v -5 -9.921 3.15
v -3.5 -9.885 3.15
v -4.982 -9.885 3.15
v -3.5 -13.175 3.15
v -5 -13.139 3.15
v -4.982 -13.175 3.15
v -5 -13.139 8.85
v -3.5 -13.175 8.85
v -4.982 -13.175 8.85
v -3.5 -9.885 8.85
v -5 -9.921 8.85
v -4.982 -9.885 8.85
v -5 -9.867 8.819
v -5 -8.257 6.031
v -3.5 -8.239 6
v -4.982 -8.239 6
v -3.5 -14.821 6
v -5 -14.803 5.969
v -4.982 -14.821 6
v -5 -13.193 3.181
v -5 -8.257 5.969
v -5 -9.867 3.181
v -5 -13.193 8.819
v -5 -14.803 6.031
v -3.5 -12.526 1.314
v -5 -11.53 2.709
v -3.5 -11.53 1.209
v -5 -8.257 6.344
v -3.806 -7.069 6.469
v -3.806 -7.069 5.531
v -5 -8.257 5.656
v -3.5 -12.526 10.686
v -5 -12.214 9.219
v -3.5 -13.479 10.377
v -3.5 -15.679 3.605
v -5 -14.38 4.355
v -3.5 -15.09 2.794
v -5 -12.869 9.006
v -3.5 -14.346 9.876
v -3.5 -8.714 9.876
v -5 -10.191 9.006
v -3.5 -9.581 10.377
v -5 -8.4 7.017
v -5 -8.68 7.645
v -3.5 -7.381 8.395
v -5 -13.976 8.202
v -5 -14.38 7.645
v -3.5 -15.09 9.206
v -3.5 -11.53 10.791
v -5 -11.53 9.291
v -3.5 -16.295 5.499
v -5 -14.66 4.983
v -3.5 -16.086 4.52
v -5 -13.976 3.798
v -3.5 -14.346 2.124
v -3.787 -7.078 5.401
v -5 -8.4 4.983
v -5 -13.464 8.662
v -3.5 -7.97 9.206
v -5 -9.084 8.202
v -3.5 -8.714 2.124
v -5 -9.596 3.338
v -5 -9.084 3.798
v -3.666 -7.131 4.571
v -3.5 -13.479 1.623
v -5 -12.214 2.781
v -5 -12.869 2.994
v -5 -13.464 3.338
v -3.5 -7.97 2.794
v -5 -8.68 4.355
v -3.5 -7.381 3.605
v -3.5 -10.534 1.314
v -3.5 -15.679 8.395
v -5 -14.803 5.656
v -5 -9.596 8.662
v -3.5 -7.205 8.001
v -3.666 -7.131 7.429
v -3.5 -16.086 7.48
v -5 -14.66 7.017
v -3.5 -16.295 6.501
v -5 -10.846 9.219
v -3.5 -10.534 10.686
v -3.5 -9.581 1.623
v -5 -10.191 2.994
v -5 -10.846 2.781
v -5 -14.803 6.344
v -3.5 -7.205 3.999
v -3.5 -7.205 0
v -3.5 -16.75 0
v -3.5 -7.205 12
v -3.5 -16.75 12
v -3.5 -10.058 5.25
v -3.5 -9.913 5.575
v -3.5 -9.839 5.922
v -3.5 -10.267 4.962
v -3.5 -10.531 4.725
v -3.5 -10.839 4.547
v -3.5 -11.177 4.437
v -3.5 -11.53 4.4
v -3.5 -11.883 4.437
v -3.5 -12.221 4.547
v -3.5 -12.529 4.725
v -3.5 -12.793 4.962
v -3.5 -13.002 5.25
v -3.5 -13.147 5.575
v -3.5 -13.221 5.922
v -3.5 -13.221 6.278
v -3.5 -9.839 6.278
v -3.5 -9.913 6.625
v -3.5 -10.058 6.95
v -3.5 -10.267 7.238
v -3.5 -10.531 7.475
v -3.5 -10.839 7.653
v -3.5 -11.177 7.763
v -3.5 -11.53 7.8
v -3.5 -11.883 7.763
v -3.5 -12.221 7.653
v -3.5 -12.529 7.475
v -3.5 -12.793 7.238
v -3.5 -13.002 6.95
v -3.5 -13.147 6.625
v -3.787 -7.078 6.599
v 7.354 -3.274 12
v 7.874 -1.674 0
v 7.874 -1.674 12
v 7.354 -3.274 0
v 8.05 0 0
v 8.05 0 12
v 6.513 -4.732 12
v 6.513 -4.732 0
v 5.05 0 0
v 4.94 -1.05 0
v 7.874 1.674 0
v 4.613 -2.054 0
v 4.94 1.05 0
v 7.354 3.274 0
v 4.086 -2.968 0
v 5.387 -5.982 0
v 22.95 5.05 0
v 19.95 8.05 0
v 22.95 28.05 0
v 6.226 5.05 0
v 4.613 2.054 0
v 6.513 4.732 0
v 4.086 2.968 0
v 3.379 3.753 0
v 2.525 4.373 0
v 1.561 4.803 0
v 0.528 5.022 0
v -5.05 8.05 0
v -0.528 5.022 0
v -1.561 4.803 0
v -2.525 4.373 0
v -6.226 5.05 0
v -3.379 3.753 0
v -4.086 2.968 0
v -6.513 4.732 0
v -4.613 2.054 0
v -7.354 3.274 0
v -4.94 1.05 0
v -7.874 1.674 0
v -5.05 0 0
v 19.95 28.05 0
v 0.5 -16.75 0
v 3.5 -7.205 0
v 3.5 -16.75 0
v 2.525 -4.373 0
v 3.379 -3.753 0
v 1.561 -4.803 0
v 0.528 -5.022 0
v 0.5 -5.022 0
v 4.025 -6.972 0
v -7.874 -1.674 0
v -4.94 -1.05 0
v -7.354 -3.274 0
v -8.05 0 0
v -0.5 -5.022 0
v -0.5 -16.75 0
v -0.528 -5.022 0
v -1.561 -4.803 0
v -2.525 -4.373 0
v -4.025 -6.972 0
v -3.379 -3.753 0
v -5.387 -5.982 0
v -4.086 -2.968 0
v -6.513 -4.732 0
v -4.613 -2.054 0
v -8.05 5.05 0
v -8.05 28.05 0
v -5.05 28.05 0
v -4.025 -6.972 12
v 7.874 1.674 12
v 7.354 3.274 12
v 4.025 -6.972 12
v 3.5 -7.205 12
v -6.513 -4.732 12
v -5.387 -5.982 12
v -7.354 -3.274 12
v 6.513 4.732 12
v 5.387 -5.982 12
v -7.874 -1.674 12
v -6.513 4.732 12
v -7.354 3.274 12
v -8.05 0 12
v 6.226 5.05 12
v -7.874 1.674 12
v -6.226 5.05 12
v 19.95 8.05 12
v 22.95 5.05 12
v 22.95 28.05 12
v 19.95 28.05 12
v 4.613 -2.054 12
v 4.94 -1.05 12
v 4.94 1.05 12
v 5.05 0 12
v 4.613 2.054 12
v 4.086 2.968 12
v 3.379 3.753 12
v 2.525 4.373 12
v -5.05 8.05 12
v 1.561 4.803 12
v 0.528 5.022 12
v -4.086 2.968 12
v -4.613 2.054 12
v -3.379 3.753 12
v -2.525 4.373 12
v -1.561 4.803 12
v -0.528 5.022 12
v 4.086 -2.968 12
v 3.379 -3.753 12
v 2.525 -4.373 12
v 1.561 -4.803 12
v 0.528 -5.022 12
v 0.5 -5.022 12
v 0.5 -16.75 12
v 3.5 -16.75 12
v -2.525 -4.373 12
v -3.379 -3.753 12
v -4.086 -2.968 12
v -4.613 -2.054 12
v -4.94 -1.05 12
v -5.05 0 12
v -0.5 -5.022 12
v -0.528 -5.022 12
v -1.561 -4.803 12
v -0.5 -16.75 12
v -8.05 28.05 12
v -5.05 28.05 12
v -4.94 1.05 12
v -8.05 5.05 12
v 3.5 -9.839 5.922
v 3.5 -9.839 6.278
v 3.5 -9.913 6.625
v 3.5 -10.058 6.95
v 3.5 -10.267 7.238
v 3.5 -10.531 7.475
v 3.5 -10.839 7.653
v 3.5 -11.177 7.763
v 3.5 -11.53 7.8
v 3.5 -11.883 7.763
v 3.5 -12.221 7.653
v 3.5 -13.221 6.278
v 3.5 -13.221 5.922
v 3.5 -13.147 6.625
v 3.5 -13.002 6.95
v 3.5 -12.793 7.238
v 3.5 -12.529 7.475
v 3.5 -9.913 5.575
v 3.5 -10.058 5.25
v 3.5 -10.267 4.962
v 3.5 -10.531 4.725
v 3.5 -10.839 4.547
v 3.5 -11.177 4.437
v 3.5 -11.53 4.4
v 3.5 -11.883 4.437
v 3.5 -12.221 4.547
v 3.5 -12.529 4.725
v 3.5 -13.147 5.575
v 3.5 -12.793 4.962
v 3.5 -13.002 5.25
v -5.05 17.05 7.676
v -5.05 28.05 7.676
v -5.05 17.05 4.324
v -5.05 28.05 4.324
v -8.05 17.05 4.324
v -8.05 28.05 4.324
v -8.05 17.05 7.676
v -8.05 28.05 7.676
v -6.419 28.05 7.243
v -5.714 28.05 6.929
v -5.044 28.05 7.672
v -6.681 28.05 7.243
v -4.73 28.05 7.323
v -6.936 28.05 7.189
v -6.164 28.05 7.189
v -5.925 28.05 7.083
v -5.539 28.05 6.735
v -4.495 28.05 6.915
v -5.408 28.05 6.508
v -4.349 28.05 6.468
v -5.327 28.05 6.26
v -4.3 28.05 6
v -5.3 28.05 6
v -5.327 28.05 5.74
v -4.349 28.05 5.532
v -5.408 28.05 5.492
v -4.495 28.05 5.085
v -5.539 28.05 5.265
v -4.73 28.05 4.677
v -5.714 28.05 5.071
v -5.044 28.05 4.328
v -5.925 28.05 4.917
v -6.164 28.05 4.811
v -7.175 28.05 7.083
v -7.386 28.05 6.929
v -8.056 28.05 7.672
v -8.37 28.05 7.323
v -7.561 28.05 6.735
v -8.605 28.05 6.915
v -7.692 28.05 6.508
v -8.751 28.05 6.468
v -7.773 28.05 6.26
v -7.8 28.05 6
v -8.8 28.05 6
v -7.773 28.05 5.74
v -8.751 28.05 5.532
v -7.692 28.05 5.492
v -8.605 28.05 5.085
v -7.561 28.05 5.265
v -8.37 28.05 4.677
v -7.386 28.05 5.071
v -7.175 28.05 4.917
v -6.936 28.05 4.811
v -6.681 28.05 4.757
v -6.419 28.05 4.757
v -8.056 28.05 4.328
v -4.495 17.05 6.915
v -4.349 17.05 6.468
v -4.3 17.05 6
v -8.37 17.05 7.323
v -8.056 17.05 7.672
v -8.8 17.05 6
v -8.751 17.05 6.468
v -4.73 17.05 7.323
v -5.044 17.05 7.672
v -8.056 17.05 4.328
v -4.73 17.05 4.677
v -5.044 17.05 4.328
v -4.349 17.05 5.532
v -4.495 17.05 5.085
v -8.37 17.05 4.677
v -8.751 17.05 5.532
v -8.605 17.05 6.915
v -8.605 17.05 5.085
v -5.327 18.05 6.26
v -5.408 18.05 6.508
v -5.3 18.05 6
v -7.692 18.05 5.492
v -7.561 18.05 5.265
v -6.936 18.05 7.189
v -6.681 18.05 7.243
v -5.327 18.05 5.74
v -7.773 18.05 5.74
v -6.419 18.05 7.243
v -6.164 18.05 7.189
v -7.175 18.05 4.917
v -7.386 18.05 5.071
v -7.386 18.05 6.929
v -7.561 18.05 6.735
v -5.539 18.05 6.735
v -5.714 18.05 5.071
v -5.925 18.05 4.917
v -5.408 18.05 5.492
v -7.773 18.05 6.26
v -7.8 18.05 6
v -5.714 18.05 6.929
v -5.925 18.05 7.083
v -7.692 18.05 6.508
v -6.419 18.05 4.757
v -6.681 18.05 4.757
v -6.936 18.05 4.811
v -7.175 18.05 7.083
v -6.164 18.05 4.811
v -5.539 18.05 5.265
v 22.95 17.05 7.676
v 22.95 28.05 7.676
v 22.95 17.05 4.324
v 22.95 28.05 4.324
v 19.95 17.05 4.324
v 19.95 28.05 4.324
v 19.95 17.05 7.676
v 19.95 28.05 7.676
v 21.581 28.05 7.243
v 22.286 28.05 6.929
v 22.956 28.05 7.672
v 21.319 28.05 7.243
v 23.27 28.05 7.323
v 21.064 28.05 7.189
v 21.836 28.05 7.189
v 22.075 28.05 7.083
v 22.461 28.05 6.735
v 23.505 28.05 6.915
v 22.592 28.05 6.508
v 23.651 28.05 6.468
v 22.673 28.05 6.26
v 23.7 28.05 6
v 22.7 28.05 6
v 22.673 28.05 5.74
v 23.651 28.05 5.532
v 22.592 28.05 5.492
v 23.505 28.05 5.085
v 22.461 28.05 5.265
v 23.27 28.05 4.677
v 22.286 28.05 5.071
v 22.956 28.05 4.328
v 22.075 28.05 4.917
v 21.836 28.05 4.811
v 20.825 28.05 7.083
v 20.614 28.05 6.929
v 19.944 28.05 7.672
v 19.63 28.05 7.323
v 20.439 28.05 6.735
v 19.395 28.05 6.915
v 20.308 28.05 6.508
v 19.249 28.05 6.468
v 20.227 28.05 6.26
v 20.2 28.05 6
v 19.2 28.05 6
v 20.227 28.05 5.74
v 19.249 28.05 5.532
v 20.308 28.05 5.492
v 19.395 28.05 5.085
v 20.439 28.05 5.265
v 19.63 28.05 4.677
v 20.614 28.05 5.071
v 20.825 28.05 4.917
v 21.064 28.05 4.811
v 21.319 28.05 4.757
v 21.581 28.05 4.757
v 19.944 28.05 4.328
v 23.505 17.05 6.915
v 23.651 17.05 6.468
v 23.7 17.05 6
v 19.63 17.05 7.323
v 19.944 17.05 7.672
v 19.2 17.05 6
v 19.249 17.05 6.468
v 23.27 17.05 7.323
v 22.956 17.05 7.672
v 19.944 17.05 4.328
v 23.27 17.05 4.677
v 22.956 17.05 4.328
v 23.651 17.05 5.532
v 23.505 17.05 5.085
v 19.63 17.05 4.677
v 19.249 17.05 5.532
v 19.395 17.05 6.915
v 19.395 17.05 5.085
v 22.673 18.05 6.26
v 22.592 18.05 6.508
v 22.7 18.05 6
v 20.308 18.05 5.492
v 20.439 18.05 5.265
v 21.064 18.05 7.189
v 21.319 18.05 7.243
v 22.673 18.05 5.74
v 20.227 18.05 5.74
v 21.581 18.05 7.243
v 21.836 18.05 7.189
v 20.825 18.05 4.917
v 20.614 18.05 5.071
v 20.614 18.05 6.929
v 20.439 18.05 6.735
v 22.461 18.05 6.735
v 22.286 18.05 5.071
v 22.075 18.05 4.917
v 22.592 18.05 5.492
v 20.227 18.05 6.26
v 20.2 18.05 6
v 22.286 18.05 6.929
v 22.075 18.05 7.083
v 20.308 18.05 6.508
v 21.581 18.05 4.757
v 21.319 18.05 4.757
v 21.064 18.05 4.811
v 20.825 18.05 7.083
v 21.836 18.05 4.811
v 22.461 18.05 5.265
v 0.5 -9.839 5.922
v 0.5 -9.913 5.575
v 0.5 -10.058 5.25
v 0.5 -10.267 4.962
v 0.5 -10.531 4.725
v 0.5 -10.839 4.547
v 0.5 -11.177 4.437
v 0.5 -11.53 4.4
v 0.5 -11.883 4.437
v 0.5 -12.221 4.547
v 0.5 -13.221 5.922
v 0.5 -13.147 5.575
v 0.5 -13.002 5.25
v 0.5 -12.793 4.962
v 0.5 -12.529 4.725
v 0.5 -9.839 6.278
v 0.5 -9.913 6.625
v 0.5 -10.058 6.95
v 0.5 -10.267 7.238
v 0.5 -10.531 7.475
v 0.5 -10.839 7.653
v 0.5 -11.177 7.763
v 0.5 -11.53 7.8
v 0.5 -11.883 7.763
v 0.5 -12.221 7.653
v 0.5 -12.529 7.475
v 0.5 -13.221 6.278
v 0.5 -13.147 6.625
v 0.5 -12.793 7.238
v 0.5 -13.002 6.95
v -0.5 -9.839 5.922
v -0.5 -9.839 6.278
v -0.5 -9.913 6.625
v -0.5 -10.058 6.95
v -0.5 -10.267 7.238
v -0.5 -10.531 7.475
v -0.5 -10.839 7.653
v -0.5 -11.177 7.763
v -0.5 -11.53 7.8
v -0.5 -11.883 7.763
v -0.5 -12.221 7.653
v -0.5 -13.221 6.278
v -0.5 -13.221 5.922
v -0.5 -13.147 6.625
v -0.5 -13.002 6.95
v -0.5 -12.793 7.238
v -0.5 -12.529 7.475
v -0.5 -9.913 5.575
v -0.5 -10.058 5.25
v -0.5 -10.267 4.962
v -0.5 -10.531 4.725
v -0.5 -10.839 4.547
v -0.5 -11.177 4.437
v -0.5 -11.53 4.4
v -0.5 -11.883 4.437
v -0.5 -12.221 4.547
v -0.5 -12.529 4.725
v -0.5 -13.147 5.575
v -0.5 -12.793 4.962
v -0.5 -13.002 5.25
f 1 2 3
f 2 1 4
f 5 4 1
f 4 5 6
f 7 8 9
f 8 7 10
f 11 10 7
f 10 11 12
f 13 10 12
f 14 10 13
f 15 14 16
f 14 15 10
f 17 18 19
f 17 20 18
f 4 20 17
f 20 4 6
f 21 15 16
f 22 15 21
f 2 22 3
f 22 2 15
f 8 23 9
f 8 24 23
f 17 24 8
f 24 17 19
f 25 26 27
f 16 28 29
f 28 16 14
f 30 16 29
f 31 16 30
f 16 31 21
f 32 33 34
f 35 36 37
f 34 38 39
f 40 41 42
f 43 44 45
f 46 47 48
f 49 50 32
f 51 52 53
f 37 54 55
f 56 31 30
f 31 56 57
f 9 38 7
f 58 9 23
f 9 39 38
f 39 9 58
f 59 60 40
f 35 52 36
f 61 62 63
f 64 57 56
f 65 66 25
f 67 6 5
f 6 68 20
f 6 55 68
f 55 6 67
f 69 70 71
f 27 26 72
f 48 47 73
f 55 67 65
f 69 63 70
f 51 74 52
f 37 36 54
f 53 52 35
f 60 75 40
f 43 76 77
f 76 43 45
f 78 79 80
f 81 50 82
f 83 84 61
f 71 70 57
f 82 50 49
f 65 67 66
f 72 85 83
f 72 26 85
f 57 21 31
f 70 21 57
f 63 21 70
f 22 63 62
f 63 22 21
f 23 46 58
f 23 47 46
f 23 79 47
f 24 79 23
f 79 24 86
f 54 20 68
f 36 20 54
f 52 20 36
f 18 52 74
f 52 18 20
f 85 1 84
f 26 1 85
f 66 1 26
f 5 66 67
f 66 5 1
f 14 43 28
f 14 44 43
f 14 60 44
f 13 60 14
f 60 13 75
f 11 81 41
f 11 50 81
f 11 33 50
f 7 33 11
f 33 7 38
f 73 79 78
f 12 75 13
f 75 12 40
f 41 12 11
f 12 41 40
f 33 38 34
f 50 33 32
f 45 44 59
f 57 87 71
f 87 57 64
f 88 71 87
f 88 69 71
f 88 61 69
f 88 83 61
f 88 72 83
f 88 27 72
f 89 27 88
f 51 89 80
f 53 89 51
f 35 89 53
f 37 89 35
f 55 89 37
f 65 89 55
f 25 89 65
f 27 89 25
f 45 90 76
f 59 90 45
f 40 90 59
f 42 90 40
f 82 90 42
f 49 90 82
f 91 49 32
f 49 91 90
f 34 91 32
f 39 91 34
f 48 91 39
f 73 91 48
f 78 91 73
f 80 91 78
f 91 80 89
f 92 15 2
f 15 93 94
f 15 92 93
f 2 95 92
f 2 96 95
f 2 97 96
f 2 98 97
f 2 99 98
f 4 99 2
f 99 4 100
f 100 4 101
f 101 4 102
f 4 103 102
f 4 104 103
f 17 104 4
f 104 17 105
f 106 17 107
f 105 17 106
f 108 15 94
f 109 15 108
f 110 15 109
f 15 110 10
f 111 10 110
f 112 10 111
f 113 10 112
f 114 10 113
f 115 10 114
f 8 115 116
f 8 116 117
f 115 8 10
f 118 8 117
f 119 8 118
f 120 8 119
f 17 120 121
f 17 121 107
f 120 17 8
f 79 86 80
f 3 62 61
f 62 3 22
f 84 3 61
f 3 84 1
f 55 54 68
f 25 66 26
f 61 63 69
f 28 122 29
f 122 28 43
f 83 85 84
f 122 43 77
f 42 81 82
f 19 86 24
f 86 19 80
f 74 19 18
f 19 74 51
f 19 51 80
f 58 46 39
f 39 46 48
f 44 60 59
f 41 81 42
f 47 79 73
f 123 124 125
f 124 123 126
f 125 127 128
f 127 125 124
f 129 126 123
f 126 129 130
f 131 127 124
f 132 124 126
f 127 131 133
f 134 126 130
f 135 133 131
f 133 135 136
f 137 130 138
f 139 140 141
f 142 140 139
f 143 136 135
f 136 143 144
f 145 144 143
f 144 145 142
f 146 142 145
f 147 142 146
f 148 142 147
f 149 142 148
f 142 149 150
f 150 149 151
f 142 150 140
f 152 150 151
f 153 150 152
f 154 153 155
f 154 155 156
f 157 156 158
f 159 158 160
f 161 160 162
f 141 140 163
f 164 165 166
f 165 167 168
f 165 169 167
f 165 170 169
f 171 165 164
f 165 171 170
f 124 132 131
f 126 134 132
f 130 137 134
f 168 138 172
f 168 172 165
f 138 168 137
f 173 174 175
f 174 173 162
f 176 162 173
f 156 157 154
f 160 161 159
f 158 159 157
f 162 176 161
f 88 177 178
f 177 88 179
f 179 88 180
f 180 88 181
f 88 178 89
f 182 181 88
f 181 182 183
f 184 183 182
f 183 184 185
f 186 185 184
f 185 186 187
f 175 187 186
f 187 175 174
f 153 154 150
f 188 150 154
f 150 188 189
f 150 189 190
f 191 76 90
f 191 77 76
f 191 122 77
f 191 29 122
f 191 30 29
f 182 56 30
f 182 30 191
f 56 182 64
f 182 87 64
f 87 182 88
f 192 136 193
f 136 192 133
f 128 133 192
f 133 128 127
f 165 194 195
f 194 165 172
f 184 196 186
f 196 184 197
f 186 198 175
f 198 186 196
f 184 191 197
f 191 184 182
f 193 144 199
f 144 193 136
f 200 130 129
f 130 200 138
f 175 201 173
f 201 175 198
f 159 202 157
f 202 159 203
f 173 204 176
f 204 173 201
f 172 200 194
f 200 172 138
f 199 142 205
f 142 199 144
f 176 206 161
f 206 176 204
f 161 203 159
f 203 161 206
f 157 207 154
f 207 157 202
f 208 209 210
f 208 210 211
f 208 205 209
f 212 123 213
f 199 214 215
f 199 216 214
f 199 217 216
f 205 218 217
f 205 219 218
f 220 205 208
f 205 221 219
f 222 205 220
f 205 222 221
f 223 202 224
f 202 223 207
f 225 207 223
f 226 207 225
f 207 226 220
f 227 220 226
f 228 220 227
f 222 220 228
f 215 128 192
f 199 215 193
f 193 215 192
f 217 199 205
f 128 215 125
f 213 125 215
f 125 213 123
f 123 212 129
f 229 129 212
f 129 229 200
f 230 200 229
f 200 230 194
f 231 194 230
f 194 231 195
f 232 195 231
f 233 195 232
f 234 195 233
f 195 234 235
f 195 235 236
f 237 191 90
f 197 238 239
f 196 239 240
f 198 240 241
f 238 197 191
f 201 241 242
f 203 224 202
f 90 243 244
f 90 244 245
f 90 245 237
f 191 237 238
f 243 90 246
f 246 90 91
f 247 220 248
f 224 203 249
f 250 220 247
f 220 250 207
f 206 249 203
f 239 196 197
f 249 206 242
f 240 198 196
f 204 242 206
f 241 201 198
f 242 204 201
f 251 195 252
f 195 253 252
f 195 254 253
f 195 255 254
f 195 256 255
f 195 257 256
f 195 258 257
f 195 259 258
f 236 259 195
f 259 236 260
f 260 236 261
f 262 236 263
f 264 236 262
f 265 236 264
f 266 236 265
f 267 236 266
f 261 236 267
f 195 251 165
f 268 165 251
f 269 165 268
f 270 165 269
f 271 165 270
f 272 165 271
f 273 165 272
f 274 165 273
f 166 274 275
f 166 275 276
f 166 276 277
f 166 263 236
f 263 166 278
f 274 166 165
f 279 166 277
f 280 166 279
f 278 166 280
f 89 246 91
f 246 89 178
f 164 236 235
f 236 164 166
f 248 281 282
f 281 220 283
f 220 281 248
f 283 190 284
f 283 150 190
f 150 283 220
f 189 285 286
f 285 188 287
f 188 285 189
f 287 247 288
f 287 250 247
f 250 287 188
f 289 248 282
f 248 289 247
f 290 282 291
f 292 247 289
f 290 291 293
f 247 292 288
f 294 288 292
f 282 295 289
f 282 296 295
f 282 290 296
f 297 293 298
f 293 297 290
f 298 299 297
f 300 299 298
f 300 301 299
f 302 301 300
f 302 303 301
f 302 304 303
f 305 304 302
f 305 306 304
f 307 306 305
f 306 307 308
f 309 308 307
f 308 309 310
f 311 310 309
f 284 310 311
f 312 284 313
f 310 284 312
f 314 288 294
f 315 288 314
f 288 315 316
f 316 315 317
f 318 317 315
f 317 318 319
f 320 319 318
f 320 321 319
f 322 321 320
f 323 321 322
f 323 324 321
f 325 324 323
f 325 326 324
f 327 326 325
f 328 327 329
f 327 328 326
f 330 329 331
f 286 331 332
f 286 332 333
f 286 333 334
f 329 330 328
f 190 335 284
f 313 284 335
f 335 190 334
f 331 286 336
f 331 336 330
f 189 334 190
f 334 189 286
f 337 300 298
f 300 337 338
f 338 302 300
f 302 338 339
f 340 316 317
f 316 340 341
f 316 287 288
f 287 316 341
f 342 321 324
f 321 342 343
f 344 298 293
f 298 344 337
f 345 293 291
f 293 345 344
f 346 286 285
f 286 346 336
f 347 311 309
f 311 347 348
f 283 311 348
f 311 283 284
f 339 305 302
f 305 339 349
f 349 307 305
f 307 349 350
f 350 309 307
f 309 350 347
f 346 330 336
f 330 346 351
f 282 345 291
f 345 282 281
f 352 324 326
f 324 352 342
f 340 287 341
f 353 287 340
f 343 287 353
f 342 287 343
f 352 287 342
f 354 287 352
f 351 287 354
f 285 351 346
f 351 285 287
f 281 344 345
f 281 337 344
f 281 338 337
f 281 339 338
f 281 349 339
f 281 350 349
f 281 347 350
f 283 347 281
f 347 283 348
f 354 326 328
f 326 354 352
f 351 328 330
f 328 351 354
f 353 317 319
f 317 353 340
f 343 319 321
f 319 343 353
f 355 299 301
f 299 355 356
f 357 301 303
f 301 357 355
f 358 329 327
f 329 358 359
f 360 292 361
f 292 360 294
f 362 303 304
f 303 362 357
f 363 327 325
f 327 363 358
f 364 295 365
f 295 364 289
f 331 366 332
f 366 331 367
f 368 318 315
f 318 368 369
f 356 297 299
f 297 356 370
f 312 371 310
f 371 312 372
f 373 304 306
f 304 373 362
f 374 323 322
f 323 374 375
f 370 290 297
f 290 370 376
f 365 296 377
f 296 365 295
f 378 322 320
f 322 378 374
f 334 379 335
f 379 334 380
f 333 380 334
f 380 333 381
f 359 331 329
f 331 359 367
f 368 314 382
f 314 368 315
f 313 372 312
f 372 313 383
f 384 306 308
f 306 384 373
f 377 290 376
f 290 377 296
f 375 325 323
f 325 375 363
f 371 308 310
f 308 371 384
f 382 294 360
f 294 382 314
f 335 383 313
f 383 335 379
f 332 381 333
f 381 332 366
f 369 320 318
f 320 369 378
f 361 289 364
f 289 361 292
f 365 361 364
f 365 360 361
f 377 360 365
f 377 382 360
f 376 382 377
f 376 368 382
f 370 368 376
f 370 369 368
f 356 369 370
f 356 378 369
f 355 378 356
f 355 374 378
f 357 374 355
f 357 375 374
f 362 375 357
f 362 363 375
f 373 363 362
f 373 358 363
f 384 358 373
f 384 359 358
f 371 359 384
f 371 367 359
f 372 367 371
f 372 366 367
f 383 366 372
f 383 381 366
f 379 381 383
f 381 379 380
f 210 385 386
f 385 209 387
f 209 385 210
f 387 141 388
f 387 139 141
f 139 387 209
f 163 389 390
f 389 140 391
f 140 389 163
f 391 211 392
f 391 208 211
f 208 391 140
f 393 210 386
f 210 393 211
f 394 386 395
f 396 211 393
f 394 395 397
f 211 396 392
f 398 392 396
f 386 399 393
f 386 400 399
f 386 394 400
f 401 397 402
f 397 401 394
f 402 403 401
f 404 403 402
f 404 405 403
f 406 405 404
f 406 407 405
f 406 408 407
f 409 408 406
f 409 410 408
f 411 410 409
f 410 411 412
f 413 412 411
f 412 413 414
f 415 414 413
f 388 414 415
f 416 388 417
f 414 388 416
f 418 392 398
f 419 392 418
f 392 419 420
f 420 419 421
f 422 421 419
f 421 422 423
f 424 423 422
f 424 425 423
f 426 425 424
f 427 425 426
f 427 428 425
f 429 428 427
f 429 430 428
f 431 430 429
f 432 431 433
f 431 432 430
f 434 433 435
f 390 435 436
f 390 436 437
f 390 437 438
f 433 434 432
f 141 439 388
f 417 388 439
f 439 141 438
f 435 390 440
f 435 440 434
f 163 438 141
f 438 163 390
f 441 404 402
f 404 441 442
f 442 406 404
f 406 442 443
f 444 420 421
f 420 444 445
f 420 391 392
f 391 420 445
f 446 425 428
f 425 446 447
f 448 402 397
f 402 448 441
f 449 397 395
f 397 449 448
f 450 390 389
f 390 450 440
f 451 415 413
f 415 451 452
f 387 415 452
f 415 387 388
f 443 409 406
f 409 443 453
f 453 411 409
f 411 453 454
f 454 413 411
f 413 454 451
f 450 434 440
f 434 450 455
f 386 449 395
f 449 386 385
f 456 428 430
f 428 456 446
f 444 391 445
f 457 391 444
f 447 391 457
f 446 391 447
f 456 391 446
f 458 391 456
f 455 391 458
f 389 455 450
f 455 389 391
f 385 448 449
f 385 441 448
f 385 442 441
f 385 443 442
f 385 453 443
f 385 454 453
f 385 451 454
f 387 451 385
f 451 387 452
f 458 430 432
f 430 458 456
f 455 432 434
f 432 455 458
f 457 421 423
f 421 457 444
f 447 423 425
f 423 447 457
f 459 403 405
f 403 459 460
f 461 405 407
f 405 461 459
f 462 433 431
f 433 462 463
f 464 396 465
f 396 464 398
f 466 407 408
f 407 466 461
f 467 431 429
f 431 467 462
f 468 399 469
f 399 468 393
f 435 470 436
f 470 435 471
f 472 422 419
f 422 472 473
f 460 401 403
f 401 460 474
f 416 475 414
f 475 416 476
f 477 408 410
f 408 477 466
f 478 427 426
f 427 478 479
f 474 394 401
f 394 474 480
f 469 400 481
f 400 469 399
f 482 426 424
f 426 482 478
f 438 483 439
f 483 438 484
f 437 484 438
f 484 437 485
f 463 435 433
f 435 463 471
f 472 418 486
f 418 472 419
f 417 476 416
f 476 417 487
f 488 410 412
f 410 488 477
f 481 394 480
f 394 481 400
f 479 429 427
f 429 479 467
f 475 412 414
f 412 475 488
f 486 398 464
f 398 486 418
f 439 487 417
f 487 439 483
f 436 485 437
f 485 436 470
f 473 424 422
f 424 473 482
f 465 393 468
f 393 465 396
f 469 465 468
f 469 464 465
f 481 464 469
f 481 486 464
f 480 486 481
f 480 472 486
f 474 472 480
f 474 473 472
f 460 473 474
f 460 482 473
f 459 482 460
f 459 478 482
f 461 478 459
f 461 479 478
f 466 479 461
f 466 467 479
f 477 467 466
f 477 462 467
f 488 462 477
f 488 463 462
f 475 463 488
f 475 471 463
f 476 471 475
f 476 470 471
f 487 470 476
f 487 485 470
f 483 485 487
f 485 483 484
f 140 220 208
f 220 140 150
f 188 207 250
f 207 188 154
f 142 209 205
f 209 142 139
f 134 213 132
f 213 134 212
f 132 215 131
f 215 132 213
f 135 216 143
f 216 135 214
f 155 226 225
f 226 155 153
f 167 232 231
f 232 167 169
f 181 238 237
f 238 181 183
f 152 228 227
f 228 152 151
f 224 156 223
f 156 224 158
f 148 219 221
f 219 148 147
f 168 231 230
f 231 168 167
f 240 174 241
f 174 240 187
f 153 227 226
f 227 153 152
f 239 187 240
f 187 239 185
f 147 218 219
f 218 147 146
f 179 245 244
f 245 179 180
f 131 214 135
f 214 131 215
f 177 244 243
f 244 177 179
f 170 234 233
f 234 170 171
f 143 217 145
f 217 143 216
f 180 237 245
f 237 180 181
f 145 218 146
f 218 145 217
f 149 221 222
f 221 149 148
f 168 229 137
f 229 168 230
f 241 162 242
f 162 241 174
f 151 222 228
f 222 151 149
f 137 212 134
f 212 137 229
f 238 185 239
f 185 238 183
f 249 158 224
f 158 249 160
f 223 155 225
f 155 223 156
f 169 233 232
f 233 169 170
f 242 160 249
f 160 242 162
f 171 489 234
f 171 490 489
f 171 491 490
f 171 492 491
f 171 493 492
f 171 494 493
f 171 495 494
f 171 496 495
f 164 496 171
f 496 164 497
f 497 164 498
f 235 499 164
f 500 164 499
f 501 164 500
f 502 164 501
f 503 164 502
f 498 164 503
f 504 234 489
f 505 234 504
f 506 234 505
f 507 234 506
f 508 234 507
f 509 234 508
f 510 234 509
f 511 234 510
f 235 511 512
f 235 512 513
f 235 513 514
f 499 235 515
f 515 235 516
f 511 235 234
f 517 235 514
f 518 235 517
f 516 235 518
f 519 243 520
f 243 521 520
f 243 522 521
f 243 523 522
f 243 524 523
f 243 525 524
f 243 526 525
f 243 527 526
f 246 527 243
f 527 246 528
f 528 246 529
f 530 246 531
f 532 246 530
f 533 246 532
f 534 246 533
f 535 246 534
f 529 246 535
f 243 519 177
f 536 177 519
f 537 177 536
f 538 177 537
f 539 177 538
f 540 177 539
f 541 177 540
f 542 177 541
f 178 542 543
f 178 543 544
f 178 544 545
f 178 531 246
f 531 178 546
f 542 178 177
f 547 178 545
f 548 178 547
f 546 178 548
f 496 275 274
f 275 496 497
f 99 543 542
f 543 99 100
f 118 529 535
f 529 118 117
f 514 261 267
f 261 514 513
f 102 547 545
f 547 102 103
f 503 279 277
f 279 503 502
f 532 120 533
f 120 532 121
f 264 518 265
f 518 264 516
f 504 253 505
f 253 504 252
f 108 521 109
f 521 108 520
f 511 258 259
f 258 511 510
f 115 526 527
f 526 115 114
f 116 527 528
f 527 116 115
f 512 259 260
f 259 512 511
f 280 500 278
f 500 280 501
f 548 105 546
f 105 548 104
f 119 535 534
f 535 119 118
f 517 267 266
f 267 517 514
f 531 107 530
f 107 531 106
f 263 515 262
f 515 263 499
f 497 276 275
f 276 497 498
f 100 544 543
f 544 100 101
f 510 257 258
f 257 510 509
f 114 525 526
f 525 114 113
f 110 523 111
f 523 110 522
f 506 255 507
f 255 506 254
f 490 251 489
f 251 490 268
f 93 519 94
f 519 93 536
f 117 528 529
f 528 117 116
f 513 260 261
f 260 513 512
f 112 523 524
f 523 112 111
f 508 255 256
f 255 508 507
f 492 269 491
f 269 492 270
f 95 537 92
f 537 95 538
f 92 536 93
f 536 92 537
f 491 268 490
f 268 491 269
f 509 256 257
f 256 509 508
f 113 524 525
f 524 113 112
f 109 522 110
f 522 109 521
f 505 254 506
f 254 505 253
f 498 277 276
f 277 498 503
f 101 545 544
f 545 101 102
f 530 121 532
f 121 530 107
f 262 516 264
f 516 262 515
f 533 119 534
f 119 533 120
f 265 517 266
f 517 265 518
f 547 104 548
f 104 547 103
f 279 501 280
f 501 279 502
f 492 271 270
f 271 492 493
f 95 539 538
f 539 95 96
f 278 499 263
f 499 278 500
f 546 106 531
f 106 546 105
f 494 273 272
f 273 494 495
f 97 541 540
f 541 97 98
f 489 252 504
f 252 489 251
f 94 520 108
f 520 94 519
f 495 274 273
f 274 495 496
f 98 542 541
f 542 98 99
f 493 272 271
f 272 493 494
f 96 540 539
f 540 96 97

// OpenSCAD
//
//  Mounting brackets for Quanum 680 and other platforms
//  that use twin tubes as equipment mounts
// 
//  by Egil Kvaleberg
//


// platform mounting tube diameter
mount_tube_dia = 10.1;  // leave some space to make fitting easier

// platform mounting tube distance
mount_tube_dist = 110.0;  // center to center (applies to dual)


// tune these:
// example: "dual" / 48 / 65 / 12 / 3
//          "single" / 40 / x / 12 / 3
//          "servo" / x / x / 12 / 3

// type of mount
mount_type = "servo"; // [ dual, single, servo ]
// offset from center line, use 0 for flat bar
mount_offset = 28.0;
// exit angle from mount 		
mount_angle = 65;
// width of clamp		
mount_width = 12;  
// wall thickness		
mount_wall = 3;		   

//servo_flange_width = 28;
//servo_screw = 2.0;
//servo_flange_height = 16; // height to bottom of mount flange

// for servo mount: flange width
servo_flange_width = 35.0;
// for servo mount: screw diameter
servo_screw = 2.5;
// for servo mount: height to bottom of mount flange
servo_flange_height = 20.0; 

// gap of flange
mount_gap = 1.0;
// mount screw diameter
screw = 3.0; // M3 is 3.0 and M2.5 is 2.5	 
// nut, across flats
nut = 5.5;    // M3 is 5.5
// nut height
nut_h = 1.5;    // M3
mount_screw = screw + 0.2;
nut_w = nut + 0.2; 
mount_flange = nut_w+2*nut_h;  // depth of flange

j = 1*0.1;
$fs = 1*0.1;

module nut_cage() {	
	difference ( ) {
		cylinder(r1 = (nut_w/2)/cos(30) + nut_h, r2 = (nut_w/2)/cos(30), h = nut_h);
		translate([0, 0, nut_h/2]) union () {
			cube([nut_w, tan(30)*nut_w, nut_h+j], center=true);
			rotate ([0, 0, 60]) cube([nut_w, tan(30)*nut_w, nut_h+j], center=true);
			rotate ([0, 0, 120])cube([nut_w, tan(30)*nut_w, nut_h+j], center=true);
		}
	}
}

module Mount_Flange_add()
{
	union () {
		cylinder(r = mount_tube_dia/2 + mount_wall, h = mount_width);
		translate([-(2*mount_wall+mount_gap)/2, 0, 0]) cube([2*mount_wall+mount_gap, mount_tube_dia/2+mount_wall+mount_flange, mount_width]);
		translate([-(mount_wall+mount_gap/2), mount_tube_dia/2 + mount_wall + mount_flange*.4, mount_width/2]) rotate([0, -90, 0]) nut_cage(); // screw hole
	}
}

module Mount_Flange_sub()
{
	translate([0, 0, -j]) union () {
		cylinder(r = mount_tube_dia/2, h = mount_width+2*j);
		translate([-mount_gap/2, 0, 0]) cube([mount_gap, mount_tube_dia/2+mount_width, mount_width+2*j]);
		translate([-(2*mount_wall+mount_gap+2*j)/2, mount_tube_dia/2 + mount_wall + mount_flange*.4, mount_width/2]) rotate([0, 90, 0]) cylinder(r = mount_screw/2 + 0.1, h = 2*mount_wall+mount_gap+2*j); // screw hole
	}
}

module Mount_Beam(gap, length)
{		
	translate([-mount_wall/2, gap, 0]) cube([mount_wall, length, mount_width]);
}

module Mount_Dual(offset, angle)
{
	leg = offset/cos(90-angle)-mount_tube_dia/2;
	color([0, 200/255, 0, 0.5])
	difference () {
		union () {
			translate([0, mount_tube_dist/2, 0]) Mount_Flange_add();
			translate([0, -mount_tube_dist/2, 0]) translate([0, 0, mount_width]) rotate([180, 0, 0]) Mount_Flange_add();

			if (leg > 0) {
				// left part	
				translate([0, -mount_tube_dist/2, 0]) rotate([0, 0, angle]) Mount_Beam(mount_tube_dia/2, leg);
				translate([-offset, offset/tan(angle)-mount_tube_dist/2, 0]) cylinder(r = mount_wall/2, h = mount_width);
				// straight part	
				translate([-offset, -mount_tube_dist/2, 0]) Mount_Beam(offset/tan(angle), mount_tube_dist - 2*offset/tan(angle));

				// right part	
				translate([0, mount_tube_dist/2, 0]) rotate([0, 0, 180-angle]) Mount_Beam(mount_tube_dia/2, leg);
				translate([-offset, -offset/tan(angle)+mount_tube_dist/2, 0]) cylinder(r = mount_wall/2, h = mount_width);
			} else {
				// straight part
				translate([0, -mount_tube_dist/2, 0]) Mount_Beam(offset/tan(angle), mount_tube_dist - 2*offset/tan(angle));
			}
		}
		union () {
			translate([0, mount_tube_dist/2, 0]) Mount_Flange_sub();
			translate([0, -mount_tube_dist/2, 0]) translate([0, 0, mount_width]) rotate([180, 0, 0]) Mount_Flange_sub();
		}
	}
}

module Mount_single(leg)
{
	color([0, 200/255, 0, 0.5])
	difference () {
		union () {
			 translate([0, 0, mount_width]) rotate([180, 0, 0]) Mount_Flange_add();

			// straight part
			Mount_Beam(mount_tube_dia/2, leg - mount_tube_dia/2);

		}
		union () {
			translate([0, 0, mount_width]) rotate([180, 0, 0]) Mount_Flange_sub();
		}
	}
}


module Mount_servo(dist)
{
	module column(dx)
	{
		translate([dx, mount_tube_dia/2, 0]) {
			difference() {
				union() {
					cube([mount_wall, mount_wall+servo_flange_height, mount_width]);
					translate([mount_wall/2, mount_wall+servo_flange_height, mount_width/2]) rotate([90, 0, 0]) cylinder(r = 1.0+servo_screw/2, h = 1.0 + servo_flange_height/2); 
				}
				// hole for servo mounting screw
				translate([mount_wall/2, mount_wall+servo_flange_height+j, mount_width/2]) rotate([90, 0, 0]) cylinder(r = servo_screw/2, h = j+servo_flange_height/2); 
			}
		}
	}

	//color([0, 200/255, 0, 0.5])
	difference () {
		union () {
			 translate([0, 0, mount_width]) rotate([180, 0, 0]) Mount_Flange_add();

			// servo
			column(-mount_tube_dia/2 - mount_wall);
			column(dist - mount_tube_dia/2 - mount_wall);
			translate([-mount_tube_dia/2 - mount_wall, mount_tube_dia/2, 0]) cube([dist+mount_wall, mount_wall, mount_width]);

		}
		union () {
			translate([0, 0, mount_width]) rotate([180, 0, 0]) Mount_Flange_sub();
		}
	}
}


module view()
{
	if (mount_type == "dual") Mount_Dual(mount_offset, mount_angle);
	else if (mount_type == "single") Mount_single(mount_offset);
	else if (mount_type == "servo") Mount_servo(mount_offset);
	else echo("Unknow mount_type");
}

view();
